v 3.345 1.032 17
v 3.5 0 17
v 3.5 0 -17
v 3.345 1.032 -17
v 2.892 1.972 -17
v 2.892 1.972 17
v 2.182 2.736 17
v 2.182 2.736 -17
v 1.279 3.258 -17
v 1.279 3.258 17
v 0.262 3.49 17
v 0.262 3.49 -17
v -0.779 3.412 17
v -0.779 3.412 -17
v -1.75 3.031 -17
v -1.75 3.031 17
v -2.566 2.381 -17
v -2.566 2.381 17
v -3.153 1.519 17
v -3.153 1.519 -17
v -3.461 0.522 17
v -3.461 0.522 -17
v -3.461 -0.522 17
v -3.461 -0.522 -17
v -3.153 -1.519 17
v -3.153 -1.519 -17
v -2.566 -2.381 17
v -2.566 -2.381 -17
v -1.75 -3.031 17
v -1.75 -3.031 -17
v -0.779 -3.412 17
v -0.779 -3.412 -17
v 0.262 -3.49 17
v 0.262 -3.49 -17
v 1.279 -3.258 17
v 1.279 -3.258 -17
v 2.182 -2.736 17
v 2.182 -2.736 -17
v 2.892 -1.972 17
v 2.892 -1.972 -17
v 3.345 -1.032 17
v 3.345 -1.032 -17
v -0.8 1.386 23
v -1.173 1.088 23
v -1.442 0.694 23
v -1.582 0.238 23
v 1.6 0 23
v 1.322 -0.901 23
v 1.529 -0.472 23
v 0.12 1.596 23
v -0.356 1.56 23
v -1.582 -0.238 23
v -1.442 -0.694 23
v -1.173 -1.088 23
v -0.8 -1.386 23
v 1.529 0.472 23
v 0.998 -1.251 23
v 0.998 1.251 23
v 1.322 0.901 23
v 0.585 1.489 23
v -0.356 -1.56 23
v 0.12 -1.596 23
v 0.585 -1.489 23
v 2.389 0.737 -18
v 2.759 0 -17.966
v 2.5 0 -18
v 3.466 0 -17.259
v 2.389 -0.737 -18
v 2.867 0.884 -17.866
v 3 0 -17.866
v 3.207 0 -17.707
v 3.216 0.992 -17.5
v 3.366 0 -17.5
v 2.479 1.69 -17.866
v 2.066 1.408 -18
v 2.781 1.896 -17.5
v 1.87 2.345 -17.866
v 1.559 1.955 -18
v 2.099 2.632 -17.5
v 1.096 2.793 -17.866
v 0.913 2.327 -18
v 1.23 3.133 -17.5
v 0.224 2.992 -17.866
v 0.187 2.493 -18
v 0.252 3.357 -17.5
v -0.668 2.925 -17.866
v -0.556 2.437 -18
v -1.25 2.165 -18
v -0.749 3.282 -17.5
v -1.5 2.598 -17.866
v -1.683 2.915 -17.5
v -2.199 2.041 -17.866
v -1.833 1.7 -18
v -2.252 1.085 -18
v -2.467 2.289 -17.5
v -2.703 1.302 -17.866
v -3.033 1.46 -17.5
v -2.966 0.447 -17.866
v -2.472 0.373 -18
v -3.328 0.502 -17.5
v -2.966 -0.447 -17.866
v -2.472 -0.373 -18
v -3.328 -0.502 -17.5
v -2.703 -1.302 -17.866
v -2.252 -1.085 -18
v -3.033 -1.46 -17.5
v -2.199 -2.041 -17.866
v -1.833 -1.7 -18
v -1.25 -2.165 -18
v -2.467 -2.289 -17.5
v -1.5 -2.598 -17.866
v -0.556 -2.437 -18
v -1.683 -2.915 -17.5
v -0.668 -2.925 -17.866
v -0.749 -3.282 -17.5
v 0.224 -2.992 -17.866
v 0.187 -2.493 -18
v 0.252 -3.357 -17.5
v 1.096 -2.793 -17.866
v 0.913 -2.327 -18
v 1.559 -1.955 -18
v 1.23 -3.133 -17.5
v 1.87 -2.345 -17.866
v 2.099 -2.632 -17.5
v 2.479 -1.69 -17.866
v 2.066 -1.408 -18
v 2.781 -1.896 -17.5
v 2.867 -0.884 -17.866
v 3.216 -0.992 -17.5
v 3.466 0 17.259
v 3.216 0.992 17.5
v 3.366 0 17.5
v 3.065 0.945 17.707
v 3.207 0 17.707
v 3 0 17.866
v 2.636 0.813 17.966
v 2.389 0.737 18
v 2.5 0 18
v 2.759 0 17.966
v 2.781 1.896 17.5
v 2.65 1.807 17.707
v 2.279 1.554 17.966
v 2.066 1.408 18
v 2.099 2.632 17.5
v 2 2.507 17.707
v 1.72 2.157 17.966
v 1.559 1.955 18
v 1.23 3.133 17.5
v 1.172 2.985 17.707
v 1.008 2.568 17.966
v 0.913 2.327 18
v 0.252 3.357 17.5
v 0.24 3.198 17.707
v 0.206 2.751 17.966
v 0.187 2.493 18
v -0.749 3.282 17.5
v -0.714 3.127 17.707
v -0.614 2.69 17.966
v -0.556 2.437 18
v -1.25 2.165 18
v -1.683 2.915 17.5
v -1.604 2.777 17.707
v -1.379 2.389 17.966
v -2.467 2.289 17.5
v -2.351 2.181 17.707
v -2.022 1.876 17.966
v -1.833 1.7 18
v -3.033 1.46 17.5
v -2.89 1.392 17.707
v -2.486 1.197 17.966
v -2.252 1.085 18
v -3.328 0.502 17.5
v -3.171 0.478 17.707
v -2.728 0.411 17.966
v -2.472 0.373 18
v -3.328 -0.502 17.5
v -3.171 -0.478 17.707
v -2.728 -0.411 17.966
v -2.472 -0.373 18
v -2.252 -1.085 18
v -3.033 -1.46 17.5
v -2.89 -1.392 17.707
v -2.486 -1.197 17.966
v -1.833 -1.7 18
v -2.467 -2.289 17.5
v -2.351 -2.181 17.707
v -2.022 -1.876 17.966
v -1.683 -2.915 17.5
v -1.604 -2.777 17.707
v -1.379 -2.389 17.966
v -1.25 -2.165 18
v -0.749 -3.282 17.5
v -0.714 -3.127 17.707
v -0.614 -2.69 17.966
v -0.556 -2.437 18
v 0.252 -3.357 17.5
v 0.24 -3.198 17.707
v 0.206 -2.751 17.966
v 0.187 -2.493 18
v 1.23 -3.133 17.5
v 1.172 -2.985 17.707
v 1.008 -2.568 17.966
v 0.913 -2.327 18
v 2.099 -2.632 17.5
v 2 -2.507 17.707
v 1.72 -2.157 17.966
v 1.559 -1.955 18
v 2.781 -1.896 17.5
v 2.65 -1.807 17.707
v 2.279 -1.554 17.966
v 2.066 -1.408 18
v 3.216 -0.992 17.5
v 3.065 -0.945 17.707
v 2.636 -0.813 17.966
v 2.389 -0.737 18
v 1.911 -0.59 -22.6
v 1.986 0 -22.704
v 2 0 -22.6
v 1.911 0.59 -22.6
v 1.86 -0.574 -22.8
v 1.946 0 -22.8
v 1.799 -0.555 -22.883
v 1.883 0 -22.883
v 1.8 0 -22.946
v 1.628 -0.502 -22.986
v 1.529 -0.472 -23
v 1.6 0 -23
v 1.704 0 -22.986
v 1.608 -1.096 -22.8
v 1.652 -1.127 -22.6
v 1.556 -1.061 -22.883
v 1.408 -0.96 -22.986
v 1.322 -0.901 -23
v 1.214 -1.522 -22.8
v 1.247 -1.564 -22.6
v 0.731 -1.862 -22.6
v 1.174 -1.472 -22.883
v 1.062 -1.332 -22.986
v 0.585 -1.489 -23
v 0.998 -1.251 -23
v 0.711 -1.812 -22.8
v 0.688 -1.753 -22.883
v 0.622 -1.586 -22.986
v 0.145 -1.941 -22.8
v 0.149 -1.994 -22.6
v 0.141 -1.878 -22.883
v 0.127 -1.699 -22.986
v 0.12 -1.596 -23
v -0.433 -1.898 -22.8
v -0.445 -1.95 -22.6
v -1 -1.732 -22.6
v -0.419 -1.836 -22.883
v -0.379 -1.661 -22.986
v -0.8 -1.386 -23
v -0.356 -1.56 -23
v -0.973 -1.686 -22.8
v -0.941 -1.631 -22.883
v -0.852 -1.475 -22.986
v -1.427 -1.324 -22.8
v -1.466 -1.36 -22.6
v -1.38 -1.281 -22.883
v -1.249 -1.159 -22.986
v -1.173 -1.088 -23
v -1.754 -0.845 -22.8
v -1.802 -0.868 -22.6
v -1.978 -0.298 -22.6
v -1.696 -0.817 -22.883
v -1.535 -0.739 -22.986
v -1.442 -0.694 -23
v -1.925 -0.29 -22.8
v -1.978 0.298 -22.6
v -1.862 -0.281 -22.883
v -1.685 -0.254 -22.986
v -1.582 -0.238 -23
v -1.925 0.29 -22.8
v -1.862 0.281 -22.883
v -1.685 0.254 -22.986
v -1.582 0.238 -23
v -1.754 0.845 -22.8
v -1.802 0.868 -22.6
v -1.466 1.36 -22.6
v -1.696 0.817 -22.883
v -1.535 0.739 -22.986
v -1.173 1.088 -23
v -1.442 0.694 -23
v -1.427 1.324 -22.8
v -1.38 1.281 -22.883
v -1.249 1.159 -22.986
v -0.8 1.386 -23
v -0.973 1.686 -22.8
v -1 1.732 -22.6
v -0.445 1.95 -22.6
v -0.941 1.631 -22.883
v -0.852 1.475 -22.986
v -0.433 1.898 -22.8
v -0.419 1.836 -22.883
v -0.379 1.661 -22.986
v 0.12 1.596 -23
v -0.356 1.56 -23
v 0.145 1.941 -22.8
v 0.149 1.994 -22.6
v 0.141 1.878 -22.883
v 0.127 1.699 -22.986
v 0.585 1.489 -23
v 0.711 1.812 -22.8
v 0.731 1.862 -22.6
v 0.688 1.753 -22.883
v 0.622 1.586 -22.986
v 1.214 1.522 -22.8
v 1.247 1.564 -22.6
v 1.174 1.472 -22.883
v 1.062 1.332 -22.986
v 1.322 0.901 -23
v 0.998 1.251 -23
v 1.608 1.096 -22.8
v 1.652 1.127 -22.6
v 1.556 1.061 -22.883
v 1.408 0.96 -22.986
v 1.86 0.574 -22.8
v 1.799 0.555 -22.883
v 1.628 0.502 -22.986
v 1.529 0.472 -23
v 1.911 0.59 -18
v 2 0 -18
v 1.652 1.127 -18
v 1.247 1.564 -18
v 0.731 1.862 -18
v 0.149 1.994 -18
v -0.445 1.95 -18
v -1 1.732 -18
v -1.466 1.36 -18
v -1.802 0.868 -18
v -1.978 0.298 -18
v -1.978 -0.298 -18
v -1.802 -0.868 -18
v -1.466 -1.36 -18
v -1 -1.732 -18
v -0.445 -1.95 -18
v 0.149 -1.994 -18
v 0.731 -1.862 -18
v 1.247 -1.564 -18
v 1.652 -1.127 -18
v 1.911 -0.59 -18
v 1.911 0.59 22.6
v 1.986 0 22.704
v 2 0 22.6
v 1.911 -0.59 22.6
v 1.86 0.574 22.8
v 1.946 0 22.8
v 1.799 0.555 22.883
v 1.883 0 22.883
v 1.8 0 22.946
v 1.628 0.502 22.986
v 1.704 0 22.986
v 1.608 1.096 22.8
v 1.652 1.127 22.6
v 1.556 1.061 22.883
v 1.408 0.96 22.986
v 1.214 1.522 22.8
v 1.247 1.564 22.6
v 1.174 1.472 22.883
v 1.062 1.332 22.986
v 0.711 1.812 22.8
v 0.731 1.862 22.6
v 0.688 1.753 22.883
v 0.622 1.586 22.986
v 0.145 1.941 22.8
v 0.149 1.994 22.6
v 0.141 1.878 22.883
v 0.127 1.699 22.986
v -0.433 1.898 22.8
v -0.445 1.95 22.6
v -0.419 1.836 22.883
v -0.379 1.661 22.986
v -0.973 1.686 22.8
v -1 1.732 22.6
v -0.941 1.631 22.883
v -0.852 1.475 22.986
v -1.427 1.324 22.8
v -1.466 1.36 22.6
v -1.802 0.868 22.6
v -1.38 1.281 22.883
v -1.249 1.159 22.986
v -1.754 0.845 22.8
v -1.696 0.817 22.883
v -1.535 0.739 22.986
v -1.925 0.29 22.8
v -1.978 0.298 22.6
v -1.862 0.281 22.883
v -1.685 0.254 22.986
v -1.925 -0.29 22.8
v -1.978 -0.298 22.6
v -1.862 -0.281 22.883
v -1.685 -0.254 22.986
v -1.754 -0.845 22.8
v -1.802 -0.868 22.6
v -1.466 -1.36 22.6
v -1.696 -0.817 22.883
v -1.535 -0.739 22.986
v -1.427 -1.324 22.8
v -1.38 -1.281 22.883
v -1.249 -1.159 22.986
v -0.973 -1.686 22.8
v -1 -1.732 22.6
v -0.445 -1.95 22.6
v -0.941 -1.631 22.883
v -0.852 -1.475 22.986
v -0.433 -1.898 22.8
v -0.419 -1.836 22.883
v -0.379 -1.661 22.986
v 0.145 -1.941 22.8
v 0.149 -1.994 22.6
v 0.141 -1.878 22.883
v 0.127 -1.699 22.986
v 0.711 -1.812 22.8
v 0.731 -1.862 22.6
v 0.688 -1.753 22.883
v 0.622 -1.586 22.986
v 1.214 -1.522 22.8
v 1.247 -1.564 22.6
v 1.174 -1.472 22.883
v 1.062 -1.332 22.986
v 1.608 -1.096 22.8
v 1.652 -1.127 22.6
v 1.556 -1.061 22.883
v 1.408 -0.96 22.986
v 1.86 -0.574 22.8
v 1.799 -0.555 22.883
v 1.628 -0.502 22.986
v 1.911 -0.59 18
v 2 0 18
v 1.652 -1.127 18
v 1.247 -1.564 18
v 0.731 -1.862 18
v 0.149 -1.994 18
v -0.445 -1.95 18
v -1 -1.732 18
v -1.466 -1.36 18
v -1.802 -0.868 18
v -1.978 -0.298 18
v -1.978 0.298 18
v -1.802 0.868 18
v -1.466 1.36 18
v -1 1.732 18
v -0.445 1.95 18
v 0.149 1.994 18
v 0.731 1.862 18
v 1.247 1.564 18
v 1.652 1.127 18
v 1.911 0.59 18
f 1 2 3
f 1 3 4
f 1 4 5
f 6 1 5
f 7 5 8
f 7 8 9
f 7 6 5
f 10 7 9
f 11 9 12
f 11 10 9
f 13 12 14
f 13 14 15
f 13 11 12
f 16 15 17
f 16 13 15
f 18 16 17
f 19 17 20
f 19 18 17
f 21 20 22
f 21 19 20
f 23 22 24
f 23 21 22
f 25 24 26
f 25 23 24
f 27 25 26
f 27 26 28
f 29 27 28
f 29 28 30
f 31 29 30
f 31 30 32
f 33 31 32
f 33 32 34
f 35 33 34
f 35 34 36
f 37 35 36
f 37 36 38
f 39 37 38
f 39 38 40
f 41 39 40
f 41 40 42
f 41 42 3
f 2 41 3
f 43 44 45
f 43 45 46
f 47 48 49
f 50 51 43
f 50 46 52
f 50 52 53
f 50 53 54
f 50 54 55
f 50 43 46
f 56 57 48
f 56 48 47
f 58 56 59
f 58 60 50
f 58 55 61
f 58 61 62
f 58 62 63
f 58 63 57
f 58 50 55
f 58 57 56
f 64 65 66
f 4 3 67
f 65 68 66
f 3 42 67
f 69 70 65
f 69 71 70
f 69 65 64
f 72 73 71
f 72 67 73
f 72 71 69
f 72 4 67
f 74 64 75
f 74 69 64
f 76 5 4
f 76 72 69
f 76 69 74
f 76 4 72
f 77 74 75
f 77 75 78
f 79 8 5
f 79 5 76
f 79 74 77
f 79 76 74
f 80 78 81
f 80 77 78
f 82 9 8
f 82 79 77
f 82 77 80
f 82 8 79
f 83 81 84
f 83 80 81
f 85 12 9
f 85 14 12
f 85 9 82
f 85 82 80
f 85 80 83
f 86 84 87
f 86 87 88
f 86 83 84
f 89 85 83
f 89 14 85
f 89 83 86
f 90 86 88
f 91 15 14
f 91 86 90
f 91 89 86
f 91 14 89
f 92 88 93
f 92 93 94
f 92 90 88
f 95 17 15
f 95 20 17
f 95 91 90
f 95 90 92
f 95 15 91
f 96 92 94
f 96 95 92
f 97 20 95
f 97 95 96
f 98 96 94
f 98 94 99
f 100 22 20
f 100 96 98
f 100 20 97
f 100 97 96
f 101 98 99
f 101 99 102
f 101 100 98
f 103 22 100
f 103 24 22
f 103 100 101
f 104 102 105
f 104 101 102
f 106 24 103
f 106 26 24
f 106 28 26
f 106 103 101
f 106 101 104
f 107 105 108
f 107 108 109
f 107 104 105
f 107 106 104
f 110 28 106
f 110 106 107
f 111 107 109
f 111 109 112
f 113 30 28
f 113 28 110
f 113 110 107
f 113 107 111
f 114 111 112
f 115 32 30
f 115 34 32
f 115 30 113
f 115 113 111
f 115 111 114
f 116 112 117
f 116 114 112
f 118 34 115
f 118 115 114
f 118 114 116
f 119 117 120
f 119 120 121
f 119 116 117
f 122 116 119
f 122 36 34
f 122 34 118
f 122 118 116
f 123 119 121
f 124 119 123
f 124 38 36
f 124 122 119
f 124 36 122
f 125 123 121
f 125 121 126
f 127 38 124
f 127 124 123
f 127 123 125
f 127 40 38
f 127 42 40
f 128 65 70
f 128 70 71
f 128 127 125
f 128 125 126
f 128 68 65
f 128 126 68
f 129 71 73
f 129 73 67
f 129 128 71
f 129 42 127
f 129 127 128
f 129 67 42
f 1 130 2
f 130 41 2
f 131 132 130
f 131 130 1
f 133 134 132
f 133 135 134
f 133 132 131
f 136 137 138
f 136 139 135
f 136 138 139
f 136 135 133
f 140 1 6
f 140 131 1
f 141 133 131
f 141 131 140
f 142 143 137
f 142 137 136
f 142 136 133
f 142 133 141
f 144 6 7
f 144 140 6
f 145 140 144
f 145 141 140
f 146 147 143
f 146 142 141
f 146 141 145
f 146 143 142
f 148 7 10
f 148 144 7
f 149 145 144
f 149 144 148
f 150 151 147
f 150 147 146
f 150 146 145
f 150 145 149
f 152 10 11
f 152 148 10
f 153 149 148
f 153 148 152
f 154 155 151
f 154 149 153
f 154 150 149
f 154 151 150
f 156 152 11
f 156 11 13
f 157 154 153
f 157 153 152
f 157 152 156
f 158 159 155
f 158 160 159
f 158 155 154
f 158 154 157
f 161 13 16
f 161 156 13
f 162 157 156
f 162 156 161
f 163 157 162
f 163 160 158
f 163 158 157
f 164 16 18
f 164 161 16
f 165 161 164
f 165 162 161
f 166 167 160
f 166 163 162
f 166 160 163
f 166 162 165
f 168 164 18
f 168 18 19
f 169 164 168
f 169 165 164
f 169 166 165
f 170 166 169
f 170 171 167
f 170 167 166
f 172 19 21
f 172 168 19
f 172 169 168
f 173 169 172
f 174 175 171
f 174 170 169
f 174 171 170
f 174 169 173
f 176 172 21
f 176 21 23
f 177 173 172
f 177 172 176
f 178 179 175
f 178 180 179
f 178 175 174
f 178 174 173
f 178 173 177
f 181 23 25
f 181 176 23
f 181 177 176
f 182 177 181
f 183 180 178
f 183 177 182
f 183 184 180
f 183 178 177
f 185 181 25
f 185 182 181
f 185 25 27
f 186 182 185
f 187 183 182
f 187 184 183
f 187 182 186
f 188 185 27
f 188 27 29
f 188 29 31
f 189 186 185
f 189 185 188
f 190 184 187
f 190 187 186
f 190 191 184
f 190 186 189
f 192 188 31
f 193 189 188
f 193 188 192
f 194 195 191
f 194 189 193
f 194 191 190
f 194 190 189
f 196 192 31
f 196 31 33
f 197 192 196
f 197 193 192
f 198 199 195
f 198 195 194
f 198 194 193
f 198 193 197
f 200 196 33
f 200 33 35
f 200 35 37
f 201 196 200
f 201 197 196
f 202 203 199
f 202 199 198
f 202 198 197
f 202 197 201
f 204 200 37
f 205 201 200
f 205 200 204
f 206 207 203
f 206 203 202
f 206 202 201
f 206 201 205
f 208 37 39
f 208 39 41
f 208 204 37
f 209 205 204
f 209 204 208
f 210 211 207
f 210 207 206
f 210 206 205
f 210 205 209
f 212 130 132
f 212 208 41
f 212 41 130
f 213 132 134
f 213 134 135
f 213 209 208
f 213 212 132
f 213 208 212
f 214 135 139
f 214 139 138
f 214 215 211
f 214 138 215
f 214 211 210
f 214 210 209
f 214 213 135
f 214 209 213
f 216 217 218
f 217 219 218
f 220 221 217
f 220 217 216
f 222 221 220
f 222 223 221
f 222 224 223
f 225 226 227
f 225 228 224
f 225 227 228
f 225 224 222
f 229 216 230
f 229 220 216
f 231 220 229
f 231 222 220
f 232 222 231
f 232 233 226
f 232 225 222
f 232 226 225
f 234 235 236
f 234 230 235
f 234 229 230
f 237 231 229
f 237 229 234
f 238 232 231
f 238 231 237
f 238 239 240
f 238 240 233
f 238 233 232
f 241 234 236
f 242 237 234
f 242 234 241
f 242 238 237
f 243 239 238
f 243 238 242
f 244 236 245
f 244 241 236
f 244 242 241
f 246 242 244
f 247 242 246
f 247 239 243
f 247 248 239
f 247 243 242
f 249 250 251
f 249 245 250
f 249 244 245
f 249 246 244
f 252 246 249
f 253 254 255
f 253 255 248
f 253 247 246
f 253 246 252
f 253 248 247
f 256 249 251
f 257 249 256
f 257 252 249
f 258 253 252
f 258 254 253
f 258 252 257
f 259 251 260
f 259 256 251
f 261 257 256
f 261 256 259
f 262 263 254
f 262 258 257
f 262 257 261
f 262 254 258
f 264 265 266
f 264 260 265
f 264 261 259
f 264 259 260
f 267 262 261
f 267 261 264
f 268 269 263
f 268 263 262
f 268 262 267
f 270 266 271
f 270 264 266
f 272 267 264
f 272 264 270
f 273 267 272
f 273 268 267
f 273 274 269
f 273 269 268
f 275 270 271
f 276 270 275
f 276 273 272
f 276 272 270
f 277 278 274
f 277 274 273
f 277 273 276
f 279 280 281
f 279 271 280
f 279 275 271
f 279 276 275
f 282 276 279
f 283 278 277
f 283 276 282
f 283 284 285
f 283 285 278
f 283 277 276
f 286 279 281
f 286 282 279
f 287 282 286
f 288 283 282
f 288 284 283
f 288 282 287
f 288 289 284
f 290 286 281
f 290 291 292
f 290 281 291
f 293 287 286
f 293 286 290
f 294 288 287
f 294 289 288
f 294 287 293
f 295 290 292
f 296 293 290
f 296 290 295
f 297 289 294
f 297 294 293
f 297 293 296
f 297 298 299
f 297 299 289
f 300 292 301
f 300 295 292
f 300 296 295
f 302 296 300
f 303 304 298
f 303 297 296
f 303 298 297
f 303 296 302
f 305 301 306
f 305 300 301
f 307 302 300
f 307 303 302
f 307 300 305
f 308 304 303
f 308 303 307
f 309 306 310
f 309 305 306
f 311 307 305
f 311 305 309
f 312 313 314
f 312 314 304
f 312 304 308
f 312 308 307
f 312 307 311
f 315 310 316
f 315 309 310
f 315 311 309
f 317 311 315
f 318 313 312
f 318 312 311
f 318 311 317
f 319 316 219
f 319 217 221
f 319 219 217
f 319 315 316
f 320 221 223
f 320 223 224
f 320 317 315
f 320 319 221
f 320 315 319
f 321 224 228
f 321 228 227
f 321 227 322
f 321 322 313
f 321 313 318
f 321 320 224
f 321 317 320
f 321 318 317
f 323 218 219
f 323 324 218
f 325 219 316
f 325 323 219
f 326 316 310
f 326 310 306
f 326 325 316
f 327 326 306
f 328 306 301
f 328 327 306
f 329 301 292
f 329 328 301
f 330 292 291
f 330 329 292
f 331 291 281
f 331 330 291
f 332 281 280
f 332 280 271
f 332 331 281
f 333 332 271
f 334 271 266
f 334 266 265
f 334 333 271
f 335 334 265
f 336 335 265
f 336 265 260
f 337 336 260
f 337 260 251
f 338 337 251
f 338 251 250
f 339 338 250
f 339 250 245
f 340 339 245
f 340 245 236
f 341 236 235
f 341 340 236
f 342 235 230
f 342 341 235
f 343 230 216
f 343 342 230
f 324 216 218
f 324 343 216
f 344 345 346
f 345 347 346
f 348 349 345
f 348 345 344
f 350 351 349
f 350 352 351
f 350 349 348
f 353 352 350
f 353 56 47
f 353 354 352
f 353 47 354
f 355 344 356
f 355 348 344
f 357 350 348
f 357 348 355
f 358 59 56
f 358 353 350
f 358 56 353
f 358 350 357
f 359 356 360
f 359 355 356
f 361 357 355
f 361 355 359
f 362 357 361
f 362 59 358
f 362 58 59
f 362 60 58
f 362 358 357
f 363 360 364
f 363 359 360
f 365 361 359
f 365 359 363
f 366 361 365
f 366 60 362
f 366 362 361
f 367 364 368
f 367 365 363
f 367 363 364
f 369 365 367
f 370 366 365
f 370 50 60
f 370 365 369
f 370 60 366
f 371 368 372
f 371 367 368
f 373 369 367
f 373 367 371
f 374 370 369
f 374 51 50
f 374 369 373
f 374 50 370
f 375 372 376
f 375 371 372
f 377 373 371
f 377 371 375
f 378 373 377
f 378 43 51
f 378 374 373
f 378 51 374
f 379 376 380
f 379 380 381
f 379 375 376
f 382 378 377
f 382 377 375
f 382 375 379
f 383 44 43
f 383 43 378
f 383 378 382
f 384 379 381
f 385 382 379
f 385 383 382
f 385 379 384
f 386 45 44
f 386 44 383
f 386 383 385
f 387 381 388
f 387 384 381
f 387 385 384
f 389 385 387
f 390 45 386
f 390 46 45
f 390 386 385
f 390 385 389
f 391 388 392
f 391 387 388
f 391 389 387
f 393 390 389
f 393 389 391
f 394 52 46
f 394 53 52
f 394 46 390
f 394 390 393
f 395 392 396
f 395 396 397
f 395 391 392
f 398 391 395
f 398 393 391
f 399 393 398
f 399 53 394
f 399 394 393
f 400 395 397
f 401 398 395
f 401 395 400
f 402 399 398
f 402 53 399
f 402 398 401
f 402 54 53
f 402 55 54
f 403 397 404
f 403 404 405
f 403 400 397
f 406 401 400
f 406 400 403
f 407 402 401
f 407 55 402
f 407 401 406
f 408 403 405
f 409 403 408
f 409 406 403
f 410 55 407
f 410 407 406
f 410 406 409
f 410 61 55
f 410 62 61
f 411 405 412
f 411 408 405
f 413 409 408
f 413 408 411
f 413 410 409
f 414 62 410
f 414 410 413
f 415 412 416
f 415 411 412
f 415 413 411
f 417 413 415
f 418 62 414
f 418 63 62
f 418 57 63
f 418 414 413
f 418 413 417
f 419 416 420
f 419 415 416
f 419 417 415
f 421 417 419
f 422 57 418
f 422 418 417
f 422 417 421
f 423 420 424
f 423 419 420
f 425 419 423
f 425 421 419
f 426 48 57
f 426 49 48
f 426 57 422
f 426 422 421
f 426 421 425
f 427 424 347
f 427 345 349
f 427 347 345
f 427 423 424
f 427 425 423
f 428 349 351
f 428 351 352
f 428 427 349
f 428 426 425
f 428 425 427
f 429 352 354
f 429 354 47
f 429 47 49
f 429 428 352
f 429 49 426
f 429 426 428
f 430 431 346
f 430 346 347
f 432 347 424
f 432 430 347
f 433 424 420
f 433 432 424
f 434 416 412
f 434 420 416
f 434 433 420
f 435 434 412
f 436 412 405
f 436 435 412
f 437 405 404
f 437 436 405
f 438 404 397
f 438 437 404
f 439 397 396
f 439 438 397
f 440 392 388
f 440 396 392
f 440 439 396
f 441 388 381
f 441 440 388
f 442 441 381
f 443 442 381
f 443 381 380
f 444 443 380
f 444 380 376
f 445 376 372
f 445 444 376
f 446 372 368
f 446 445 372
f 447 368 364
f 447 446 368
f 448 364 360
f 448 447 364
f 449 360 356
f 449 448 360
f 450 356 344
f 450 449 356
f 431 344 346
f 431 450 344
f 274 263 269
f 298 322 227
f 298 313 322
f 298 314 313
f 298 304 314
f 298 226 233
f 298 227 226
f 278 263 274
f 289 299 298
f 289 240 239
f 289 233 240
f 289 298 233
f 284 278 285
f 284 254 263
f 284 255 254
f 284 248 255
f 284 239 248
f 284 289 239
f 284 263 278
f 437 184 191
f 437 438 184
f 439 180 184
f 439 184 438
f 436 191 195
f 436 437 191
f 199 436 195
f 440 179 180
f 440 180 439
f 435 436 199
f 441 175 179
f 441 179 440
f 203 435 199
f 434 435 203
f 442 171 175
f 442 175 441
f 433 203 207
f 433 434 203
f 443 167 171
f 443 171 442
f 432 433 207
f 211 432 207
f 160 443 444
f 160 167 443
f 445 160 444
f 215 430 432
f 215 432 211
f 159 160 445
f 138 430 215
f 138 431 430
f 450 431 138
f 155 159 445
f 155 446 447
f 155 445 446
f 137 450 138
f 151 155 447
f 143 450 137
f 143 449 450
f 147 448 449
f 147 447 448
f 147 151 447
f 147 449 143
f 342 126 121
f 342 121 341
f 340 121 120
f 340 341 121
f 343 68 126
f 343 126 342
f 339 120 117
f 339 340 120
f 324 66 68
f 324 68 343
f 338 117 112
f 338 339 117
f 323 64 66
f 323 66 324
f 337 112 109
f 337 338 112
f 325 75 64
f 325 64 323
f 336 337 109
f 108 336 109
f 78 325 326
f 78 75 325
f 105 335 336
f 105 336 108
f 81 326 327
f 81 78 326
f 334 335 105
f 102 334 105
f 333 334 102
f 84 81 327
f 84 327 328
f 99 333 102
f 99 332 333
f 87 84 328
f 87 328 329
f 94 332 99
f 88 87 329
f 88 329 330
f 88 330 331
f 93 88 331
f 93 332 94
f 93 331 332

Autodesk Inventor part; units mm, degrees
ref_plane "YZ Plane" through (0, 0, 0) normal (1, 0, 0) x (0, 1, 0)
ref_plane "XZ Plane" through (0, 0, 0) normal (0, 1, 0) x (-1, 0, 0)
ref_plane "XY Plane" through (0, 0, 0) normal (0, 0, 1) x (1, 0, 0)
sketch "Sketch1" plane through (0, 0, 0) normal (0, 0, 1) x (1, 0, 0)
  circle A0 centre (0, 0) radius 2
  circle A1 centre (0, 0) radius 3.5
  dimension "d0" = 7
  dimension "d1" = 4
extrude "Extrusion1" add sketch "Sketch1" along normal blind 18
extrude "Extrusion2" add sketch "Sketch1" along normal blind 23 contours A0
fillet "Fillet1" radius 1 1 edges at (-3.5, 0, 18)
fillet "Fillet2" radius 0.4 1 edges at (-2, 0, 23)
mirror "Mirror1" about plane through (0, 0, 0) normal (0, 0, 1) of "Extrusion1", "Extrusion2", "Fillet1", "Fillet2"
equation "\"d2\" = 0.5 * length"
equation "\"length\" = 36"
properties part number "SCAMI D-PA C-RAIL ROLLER"
